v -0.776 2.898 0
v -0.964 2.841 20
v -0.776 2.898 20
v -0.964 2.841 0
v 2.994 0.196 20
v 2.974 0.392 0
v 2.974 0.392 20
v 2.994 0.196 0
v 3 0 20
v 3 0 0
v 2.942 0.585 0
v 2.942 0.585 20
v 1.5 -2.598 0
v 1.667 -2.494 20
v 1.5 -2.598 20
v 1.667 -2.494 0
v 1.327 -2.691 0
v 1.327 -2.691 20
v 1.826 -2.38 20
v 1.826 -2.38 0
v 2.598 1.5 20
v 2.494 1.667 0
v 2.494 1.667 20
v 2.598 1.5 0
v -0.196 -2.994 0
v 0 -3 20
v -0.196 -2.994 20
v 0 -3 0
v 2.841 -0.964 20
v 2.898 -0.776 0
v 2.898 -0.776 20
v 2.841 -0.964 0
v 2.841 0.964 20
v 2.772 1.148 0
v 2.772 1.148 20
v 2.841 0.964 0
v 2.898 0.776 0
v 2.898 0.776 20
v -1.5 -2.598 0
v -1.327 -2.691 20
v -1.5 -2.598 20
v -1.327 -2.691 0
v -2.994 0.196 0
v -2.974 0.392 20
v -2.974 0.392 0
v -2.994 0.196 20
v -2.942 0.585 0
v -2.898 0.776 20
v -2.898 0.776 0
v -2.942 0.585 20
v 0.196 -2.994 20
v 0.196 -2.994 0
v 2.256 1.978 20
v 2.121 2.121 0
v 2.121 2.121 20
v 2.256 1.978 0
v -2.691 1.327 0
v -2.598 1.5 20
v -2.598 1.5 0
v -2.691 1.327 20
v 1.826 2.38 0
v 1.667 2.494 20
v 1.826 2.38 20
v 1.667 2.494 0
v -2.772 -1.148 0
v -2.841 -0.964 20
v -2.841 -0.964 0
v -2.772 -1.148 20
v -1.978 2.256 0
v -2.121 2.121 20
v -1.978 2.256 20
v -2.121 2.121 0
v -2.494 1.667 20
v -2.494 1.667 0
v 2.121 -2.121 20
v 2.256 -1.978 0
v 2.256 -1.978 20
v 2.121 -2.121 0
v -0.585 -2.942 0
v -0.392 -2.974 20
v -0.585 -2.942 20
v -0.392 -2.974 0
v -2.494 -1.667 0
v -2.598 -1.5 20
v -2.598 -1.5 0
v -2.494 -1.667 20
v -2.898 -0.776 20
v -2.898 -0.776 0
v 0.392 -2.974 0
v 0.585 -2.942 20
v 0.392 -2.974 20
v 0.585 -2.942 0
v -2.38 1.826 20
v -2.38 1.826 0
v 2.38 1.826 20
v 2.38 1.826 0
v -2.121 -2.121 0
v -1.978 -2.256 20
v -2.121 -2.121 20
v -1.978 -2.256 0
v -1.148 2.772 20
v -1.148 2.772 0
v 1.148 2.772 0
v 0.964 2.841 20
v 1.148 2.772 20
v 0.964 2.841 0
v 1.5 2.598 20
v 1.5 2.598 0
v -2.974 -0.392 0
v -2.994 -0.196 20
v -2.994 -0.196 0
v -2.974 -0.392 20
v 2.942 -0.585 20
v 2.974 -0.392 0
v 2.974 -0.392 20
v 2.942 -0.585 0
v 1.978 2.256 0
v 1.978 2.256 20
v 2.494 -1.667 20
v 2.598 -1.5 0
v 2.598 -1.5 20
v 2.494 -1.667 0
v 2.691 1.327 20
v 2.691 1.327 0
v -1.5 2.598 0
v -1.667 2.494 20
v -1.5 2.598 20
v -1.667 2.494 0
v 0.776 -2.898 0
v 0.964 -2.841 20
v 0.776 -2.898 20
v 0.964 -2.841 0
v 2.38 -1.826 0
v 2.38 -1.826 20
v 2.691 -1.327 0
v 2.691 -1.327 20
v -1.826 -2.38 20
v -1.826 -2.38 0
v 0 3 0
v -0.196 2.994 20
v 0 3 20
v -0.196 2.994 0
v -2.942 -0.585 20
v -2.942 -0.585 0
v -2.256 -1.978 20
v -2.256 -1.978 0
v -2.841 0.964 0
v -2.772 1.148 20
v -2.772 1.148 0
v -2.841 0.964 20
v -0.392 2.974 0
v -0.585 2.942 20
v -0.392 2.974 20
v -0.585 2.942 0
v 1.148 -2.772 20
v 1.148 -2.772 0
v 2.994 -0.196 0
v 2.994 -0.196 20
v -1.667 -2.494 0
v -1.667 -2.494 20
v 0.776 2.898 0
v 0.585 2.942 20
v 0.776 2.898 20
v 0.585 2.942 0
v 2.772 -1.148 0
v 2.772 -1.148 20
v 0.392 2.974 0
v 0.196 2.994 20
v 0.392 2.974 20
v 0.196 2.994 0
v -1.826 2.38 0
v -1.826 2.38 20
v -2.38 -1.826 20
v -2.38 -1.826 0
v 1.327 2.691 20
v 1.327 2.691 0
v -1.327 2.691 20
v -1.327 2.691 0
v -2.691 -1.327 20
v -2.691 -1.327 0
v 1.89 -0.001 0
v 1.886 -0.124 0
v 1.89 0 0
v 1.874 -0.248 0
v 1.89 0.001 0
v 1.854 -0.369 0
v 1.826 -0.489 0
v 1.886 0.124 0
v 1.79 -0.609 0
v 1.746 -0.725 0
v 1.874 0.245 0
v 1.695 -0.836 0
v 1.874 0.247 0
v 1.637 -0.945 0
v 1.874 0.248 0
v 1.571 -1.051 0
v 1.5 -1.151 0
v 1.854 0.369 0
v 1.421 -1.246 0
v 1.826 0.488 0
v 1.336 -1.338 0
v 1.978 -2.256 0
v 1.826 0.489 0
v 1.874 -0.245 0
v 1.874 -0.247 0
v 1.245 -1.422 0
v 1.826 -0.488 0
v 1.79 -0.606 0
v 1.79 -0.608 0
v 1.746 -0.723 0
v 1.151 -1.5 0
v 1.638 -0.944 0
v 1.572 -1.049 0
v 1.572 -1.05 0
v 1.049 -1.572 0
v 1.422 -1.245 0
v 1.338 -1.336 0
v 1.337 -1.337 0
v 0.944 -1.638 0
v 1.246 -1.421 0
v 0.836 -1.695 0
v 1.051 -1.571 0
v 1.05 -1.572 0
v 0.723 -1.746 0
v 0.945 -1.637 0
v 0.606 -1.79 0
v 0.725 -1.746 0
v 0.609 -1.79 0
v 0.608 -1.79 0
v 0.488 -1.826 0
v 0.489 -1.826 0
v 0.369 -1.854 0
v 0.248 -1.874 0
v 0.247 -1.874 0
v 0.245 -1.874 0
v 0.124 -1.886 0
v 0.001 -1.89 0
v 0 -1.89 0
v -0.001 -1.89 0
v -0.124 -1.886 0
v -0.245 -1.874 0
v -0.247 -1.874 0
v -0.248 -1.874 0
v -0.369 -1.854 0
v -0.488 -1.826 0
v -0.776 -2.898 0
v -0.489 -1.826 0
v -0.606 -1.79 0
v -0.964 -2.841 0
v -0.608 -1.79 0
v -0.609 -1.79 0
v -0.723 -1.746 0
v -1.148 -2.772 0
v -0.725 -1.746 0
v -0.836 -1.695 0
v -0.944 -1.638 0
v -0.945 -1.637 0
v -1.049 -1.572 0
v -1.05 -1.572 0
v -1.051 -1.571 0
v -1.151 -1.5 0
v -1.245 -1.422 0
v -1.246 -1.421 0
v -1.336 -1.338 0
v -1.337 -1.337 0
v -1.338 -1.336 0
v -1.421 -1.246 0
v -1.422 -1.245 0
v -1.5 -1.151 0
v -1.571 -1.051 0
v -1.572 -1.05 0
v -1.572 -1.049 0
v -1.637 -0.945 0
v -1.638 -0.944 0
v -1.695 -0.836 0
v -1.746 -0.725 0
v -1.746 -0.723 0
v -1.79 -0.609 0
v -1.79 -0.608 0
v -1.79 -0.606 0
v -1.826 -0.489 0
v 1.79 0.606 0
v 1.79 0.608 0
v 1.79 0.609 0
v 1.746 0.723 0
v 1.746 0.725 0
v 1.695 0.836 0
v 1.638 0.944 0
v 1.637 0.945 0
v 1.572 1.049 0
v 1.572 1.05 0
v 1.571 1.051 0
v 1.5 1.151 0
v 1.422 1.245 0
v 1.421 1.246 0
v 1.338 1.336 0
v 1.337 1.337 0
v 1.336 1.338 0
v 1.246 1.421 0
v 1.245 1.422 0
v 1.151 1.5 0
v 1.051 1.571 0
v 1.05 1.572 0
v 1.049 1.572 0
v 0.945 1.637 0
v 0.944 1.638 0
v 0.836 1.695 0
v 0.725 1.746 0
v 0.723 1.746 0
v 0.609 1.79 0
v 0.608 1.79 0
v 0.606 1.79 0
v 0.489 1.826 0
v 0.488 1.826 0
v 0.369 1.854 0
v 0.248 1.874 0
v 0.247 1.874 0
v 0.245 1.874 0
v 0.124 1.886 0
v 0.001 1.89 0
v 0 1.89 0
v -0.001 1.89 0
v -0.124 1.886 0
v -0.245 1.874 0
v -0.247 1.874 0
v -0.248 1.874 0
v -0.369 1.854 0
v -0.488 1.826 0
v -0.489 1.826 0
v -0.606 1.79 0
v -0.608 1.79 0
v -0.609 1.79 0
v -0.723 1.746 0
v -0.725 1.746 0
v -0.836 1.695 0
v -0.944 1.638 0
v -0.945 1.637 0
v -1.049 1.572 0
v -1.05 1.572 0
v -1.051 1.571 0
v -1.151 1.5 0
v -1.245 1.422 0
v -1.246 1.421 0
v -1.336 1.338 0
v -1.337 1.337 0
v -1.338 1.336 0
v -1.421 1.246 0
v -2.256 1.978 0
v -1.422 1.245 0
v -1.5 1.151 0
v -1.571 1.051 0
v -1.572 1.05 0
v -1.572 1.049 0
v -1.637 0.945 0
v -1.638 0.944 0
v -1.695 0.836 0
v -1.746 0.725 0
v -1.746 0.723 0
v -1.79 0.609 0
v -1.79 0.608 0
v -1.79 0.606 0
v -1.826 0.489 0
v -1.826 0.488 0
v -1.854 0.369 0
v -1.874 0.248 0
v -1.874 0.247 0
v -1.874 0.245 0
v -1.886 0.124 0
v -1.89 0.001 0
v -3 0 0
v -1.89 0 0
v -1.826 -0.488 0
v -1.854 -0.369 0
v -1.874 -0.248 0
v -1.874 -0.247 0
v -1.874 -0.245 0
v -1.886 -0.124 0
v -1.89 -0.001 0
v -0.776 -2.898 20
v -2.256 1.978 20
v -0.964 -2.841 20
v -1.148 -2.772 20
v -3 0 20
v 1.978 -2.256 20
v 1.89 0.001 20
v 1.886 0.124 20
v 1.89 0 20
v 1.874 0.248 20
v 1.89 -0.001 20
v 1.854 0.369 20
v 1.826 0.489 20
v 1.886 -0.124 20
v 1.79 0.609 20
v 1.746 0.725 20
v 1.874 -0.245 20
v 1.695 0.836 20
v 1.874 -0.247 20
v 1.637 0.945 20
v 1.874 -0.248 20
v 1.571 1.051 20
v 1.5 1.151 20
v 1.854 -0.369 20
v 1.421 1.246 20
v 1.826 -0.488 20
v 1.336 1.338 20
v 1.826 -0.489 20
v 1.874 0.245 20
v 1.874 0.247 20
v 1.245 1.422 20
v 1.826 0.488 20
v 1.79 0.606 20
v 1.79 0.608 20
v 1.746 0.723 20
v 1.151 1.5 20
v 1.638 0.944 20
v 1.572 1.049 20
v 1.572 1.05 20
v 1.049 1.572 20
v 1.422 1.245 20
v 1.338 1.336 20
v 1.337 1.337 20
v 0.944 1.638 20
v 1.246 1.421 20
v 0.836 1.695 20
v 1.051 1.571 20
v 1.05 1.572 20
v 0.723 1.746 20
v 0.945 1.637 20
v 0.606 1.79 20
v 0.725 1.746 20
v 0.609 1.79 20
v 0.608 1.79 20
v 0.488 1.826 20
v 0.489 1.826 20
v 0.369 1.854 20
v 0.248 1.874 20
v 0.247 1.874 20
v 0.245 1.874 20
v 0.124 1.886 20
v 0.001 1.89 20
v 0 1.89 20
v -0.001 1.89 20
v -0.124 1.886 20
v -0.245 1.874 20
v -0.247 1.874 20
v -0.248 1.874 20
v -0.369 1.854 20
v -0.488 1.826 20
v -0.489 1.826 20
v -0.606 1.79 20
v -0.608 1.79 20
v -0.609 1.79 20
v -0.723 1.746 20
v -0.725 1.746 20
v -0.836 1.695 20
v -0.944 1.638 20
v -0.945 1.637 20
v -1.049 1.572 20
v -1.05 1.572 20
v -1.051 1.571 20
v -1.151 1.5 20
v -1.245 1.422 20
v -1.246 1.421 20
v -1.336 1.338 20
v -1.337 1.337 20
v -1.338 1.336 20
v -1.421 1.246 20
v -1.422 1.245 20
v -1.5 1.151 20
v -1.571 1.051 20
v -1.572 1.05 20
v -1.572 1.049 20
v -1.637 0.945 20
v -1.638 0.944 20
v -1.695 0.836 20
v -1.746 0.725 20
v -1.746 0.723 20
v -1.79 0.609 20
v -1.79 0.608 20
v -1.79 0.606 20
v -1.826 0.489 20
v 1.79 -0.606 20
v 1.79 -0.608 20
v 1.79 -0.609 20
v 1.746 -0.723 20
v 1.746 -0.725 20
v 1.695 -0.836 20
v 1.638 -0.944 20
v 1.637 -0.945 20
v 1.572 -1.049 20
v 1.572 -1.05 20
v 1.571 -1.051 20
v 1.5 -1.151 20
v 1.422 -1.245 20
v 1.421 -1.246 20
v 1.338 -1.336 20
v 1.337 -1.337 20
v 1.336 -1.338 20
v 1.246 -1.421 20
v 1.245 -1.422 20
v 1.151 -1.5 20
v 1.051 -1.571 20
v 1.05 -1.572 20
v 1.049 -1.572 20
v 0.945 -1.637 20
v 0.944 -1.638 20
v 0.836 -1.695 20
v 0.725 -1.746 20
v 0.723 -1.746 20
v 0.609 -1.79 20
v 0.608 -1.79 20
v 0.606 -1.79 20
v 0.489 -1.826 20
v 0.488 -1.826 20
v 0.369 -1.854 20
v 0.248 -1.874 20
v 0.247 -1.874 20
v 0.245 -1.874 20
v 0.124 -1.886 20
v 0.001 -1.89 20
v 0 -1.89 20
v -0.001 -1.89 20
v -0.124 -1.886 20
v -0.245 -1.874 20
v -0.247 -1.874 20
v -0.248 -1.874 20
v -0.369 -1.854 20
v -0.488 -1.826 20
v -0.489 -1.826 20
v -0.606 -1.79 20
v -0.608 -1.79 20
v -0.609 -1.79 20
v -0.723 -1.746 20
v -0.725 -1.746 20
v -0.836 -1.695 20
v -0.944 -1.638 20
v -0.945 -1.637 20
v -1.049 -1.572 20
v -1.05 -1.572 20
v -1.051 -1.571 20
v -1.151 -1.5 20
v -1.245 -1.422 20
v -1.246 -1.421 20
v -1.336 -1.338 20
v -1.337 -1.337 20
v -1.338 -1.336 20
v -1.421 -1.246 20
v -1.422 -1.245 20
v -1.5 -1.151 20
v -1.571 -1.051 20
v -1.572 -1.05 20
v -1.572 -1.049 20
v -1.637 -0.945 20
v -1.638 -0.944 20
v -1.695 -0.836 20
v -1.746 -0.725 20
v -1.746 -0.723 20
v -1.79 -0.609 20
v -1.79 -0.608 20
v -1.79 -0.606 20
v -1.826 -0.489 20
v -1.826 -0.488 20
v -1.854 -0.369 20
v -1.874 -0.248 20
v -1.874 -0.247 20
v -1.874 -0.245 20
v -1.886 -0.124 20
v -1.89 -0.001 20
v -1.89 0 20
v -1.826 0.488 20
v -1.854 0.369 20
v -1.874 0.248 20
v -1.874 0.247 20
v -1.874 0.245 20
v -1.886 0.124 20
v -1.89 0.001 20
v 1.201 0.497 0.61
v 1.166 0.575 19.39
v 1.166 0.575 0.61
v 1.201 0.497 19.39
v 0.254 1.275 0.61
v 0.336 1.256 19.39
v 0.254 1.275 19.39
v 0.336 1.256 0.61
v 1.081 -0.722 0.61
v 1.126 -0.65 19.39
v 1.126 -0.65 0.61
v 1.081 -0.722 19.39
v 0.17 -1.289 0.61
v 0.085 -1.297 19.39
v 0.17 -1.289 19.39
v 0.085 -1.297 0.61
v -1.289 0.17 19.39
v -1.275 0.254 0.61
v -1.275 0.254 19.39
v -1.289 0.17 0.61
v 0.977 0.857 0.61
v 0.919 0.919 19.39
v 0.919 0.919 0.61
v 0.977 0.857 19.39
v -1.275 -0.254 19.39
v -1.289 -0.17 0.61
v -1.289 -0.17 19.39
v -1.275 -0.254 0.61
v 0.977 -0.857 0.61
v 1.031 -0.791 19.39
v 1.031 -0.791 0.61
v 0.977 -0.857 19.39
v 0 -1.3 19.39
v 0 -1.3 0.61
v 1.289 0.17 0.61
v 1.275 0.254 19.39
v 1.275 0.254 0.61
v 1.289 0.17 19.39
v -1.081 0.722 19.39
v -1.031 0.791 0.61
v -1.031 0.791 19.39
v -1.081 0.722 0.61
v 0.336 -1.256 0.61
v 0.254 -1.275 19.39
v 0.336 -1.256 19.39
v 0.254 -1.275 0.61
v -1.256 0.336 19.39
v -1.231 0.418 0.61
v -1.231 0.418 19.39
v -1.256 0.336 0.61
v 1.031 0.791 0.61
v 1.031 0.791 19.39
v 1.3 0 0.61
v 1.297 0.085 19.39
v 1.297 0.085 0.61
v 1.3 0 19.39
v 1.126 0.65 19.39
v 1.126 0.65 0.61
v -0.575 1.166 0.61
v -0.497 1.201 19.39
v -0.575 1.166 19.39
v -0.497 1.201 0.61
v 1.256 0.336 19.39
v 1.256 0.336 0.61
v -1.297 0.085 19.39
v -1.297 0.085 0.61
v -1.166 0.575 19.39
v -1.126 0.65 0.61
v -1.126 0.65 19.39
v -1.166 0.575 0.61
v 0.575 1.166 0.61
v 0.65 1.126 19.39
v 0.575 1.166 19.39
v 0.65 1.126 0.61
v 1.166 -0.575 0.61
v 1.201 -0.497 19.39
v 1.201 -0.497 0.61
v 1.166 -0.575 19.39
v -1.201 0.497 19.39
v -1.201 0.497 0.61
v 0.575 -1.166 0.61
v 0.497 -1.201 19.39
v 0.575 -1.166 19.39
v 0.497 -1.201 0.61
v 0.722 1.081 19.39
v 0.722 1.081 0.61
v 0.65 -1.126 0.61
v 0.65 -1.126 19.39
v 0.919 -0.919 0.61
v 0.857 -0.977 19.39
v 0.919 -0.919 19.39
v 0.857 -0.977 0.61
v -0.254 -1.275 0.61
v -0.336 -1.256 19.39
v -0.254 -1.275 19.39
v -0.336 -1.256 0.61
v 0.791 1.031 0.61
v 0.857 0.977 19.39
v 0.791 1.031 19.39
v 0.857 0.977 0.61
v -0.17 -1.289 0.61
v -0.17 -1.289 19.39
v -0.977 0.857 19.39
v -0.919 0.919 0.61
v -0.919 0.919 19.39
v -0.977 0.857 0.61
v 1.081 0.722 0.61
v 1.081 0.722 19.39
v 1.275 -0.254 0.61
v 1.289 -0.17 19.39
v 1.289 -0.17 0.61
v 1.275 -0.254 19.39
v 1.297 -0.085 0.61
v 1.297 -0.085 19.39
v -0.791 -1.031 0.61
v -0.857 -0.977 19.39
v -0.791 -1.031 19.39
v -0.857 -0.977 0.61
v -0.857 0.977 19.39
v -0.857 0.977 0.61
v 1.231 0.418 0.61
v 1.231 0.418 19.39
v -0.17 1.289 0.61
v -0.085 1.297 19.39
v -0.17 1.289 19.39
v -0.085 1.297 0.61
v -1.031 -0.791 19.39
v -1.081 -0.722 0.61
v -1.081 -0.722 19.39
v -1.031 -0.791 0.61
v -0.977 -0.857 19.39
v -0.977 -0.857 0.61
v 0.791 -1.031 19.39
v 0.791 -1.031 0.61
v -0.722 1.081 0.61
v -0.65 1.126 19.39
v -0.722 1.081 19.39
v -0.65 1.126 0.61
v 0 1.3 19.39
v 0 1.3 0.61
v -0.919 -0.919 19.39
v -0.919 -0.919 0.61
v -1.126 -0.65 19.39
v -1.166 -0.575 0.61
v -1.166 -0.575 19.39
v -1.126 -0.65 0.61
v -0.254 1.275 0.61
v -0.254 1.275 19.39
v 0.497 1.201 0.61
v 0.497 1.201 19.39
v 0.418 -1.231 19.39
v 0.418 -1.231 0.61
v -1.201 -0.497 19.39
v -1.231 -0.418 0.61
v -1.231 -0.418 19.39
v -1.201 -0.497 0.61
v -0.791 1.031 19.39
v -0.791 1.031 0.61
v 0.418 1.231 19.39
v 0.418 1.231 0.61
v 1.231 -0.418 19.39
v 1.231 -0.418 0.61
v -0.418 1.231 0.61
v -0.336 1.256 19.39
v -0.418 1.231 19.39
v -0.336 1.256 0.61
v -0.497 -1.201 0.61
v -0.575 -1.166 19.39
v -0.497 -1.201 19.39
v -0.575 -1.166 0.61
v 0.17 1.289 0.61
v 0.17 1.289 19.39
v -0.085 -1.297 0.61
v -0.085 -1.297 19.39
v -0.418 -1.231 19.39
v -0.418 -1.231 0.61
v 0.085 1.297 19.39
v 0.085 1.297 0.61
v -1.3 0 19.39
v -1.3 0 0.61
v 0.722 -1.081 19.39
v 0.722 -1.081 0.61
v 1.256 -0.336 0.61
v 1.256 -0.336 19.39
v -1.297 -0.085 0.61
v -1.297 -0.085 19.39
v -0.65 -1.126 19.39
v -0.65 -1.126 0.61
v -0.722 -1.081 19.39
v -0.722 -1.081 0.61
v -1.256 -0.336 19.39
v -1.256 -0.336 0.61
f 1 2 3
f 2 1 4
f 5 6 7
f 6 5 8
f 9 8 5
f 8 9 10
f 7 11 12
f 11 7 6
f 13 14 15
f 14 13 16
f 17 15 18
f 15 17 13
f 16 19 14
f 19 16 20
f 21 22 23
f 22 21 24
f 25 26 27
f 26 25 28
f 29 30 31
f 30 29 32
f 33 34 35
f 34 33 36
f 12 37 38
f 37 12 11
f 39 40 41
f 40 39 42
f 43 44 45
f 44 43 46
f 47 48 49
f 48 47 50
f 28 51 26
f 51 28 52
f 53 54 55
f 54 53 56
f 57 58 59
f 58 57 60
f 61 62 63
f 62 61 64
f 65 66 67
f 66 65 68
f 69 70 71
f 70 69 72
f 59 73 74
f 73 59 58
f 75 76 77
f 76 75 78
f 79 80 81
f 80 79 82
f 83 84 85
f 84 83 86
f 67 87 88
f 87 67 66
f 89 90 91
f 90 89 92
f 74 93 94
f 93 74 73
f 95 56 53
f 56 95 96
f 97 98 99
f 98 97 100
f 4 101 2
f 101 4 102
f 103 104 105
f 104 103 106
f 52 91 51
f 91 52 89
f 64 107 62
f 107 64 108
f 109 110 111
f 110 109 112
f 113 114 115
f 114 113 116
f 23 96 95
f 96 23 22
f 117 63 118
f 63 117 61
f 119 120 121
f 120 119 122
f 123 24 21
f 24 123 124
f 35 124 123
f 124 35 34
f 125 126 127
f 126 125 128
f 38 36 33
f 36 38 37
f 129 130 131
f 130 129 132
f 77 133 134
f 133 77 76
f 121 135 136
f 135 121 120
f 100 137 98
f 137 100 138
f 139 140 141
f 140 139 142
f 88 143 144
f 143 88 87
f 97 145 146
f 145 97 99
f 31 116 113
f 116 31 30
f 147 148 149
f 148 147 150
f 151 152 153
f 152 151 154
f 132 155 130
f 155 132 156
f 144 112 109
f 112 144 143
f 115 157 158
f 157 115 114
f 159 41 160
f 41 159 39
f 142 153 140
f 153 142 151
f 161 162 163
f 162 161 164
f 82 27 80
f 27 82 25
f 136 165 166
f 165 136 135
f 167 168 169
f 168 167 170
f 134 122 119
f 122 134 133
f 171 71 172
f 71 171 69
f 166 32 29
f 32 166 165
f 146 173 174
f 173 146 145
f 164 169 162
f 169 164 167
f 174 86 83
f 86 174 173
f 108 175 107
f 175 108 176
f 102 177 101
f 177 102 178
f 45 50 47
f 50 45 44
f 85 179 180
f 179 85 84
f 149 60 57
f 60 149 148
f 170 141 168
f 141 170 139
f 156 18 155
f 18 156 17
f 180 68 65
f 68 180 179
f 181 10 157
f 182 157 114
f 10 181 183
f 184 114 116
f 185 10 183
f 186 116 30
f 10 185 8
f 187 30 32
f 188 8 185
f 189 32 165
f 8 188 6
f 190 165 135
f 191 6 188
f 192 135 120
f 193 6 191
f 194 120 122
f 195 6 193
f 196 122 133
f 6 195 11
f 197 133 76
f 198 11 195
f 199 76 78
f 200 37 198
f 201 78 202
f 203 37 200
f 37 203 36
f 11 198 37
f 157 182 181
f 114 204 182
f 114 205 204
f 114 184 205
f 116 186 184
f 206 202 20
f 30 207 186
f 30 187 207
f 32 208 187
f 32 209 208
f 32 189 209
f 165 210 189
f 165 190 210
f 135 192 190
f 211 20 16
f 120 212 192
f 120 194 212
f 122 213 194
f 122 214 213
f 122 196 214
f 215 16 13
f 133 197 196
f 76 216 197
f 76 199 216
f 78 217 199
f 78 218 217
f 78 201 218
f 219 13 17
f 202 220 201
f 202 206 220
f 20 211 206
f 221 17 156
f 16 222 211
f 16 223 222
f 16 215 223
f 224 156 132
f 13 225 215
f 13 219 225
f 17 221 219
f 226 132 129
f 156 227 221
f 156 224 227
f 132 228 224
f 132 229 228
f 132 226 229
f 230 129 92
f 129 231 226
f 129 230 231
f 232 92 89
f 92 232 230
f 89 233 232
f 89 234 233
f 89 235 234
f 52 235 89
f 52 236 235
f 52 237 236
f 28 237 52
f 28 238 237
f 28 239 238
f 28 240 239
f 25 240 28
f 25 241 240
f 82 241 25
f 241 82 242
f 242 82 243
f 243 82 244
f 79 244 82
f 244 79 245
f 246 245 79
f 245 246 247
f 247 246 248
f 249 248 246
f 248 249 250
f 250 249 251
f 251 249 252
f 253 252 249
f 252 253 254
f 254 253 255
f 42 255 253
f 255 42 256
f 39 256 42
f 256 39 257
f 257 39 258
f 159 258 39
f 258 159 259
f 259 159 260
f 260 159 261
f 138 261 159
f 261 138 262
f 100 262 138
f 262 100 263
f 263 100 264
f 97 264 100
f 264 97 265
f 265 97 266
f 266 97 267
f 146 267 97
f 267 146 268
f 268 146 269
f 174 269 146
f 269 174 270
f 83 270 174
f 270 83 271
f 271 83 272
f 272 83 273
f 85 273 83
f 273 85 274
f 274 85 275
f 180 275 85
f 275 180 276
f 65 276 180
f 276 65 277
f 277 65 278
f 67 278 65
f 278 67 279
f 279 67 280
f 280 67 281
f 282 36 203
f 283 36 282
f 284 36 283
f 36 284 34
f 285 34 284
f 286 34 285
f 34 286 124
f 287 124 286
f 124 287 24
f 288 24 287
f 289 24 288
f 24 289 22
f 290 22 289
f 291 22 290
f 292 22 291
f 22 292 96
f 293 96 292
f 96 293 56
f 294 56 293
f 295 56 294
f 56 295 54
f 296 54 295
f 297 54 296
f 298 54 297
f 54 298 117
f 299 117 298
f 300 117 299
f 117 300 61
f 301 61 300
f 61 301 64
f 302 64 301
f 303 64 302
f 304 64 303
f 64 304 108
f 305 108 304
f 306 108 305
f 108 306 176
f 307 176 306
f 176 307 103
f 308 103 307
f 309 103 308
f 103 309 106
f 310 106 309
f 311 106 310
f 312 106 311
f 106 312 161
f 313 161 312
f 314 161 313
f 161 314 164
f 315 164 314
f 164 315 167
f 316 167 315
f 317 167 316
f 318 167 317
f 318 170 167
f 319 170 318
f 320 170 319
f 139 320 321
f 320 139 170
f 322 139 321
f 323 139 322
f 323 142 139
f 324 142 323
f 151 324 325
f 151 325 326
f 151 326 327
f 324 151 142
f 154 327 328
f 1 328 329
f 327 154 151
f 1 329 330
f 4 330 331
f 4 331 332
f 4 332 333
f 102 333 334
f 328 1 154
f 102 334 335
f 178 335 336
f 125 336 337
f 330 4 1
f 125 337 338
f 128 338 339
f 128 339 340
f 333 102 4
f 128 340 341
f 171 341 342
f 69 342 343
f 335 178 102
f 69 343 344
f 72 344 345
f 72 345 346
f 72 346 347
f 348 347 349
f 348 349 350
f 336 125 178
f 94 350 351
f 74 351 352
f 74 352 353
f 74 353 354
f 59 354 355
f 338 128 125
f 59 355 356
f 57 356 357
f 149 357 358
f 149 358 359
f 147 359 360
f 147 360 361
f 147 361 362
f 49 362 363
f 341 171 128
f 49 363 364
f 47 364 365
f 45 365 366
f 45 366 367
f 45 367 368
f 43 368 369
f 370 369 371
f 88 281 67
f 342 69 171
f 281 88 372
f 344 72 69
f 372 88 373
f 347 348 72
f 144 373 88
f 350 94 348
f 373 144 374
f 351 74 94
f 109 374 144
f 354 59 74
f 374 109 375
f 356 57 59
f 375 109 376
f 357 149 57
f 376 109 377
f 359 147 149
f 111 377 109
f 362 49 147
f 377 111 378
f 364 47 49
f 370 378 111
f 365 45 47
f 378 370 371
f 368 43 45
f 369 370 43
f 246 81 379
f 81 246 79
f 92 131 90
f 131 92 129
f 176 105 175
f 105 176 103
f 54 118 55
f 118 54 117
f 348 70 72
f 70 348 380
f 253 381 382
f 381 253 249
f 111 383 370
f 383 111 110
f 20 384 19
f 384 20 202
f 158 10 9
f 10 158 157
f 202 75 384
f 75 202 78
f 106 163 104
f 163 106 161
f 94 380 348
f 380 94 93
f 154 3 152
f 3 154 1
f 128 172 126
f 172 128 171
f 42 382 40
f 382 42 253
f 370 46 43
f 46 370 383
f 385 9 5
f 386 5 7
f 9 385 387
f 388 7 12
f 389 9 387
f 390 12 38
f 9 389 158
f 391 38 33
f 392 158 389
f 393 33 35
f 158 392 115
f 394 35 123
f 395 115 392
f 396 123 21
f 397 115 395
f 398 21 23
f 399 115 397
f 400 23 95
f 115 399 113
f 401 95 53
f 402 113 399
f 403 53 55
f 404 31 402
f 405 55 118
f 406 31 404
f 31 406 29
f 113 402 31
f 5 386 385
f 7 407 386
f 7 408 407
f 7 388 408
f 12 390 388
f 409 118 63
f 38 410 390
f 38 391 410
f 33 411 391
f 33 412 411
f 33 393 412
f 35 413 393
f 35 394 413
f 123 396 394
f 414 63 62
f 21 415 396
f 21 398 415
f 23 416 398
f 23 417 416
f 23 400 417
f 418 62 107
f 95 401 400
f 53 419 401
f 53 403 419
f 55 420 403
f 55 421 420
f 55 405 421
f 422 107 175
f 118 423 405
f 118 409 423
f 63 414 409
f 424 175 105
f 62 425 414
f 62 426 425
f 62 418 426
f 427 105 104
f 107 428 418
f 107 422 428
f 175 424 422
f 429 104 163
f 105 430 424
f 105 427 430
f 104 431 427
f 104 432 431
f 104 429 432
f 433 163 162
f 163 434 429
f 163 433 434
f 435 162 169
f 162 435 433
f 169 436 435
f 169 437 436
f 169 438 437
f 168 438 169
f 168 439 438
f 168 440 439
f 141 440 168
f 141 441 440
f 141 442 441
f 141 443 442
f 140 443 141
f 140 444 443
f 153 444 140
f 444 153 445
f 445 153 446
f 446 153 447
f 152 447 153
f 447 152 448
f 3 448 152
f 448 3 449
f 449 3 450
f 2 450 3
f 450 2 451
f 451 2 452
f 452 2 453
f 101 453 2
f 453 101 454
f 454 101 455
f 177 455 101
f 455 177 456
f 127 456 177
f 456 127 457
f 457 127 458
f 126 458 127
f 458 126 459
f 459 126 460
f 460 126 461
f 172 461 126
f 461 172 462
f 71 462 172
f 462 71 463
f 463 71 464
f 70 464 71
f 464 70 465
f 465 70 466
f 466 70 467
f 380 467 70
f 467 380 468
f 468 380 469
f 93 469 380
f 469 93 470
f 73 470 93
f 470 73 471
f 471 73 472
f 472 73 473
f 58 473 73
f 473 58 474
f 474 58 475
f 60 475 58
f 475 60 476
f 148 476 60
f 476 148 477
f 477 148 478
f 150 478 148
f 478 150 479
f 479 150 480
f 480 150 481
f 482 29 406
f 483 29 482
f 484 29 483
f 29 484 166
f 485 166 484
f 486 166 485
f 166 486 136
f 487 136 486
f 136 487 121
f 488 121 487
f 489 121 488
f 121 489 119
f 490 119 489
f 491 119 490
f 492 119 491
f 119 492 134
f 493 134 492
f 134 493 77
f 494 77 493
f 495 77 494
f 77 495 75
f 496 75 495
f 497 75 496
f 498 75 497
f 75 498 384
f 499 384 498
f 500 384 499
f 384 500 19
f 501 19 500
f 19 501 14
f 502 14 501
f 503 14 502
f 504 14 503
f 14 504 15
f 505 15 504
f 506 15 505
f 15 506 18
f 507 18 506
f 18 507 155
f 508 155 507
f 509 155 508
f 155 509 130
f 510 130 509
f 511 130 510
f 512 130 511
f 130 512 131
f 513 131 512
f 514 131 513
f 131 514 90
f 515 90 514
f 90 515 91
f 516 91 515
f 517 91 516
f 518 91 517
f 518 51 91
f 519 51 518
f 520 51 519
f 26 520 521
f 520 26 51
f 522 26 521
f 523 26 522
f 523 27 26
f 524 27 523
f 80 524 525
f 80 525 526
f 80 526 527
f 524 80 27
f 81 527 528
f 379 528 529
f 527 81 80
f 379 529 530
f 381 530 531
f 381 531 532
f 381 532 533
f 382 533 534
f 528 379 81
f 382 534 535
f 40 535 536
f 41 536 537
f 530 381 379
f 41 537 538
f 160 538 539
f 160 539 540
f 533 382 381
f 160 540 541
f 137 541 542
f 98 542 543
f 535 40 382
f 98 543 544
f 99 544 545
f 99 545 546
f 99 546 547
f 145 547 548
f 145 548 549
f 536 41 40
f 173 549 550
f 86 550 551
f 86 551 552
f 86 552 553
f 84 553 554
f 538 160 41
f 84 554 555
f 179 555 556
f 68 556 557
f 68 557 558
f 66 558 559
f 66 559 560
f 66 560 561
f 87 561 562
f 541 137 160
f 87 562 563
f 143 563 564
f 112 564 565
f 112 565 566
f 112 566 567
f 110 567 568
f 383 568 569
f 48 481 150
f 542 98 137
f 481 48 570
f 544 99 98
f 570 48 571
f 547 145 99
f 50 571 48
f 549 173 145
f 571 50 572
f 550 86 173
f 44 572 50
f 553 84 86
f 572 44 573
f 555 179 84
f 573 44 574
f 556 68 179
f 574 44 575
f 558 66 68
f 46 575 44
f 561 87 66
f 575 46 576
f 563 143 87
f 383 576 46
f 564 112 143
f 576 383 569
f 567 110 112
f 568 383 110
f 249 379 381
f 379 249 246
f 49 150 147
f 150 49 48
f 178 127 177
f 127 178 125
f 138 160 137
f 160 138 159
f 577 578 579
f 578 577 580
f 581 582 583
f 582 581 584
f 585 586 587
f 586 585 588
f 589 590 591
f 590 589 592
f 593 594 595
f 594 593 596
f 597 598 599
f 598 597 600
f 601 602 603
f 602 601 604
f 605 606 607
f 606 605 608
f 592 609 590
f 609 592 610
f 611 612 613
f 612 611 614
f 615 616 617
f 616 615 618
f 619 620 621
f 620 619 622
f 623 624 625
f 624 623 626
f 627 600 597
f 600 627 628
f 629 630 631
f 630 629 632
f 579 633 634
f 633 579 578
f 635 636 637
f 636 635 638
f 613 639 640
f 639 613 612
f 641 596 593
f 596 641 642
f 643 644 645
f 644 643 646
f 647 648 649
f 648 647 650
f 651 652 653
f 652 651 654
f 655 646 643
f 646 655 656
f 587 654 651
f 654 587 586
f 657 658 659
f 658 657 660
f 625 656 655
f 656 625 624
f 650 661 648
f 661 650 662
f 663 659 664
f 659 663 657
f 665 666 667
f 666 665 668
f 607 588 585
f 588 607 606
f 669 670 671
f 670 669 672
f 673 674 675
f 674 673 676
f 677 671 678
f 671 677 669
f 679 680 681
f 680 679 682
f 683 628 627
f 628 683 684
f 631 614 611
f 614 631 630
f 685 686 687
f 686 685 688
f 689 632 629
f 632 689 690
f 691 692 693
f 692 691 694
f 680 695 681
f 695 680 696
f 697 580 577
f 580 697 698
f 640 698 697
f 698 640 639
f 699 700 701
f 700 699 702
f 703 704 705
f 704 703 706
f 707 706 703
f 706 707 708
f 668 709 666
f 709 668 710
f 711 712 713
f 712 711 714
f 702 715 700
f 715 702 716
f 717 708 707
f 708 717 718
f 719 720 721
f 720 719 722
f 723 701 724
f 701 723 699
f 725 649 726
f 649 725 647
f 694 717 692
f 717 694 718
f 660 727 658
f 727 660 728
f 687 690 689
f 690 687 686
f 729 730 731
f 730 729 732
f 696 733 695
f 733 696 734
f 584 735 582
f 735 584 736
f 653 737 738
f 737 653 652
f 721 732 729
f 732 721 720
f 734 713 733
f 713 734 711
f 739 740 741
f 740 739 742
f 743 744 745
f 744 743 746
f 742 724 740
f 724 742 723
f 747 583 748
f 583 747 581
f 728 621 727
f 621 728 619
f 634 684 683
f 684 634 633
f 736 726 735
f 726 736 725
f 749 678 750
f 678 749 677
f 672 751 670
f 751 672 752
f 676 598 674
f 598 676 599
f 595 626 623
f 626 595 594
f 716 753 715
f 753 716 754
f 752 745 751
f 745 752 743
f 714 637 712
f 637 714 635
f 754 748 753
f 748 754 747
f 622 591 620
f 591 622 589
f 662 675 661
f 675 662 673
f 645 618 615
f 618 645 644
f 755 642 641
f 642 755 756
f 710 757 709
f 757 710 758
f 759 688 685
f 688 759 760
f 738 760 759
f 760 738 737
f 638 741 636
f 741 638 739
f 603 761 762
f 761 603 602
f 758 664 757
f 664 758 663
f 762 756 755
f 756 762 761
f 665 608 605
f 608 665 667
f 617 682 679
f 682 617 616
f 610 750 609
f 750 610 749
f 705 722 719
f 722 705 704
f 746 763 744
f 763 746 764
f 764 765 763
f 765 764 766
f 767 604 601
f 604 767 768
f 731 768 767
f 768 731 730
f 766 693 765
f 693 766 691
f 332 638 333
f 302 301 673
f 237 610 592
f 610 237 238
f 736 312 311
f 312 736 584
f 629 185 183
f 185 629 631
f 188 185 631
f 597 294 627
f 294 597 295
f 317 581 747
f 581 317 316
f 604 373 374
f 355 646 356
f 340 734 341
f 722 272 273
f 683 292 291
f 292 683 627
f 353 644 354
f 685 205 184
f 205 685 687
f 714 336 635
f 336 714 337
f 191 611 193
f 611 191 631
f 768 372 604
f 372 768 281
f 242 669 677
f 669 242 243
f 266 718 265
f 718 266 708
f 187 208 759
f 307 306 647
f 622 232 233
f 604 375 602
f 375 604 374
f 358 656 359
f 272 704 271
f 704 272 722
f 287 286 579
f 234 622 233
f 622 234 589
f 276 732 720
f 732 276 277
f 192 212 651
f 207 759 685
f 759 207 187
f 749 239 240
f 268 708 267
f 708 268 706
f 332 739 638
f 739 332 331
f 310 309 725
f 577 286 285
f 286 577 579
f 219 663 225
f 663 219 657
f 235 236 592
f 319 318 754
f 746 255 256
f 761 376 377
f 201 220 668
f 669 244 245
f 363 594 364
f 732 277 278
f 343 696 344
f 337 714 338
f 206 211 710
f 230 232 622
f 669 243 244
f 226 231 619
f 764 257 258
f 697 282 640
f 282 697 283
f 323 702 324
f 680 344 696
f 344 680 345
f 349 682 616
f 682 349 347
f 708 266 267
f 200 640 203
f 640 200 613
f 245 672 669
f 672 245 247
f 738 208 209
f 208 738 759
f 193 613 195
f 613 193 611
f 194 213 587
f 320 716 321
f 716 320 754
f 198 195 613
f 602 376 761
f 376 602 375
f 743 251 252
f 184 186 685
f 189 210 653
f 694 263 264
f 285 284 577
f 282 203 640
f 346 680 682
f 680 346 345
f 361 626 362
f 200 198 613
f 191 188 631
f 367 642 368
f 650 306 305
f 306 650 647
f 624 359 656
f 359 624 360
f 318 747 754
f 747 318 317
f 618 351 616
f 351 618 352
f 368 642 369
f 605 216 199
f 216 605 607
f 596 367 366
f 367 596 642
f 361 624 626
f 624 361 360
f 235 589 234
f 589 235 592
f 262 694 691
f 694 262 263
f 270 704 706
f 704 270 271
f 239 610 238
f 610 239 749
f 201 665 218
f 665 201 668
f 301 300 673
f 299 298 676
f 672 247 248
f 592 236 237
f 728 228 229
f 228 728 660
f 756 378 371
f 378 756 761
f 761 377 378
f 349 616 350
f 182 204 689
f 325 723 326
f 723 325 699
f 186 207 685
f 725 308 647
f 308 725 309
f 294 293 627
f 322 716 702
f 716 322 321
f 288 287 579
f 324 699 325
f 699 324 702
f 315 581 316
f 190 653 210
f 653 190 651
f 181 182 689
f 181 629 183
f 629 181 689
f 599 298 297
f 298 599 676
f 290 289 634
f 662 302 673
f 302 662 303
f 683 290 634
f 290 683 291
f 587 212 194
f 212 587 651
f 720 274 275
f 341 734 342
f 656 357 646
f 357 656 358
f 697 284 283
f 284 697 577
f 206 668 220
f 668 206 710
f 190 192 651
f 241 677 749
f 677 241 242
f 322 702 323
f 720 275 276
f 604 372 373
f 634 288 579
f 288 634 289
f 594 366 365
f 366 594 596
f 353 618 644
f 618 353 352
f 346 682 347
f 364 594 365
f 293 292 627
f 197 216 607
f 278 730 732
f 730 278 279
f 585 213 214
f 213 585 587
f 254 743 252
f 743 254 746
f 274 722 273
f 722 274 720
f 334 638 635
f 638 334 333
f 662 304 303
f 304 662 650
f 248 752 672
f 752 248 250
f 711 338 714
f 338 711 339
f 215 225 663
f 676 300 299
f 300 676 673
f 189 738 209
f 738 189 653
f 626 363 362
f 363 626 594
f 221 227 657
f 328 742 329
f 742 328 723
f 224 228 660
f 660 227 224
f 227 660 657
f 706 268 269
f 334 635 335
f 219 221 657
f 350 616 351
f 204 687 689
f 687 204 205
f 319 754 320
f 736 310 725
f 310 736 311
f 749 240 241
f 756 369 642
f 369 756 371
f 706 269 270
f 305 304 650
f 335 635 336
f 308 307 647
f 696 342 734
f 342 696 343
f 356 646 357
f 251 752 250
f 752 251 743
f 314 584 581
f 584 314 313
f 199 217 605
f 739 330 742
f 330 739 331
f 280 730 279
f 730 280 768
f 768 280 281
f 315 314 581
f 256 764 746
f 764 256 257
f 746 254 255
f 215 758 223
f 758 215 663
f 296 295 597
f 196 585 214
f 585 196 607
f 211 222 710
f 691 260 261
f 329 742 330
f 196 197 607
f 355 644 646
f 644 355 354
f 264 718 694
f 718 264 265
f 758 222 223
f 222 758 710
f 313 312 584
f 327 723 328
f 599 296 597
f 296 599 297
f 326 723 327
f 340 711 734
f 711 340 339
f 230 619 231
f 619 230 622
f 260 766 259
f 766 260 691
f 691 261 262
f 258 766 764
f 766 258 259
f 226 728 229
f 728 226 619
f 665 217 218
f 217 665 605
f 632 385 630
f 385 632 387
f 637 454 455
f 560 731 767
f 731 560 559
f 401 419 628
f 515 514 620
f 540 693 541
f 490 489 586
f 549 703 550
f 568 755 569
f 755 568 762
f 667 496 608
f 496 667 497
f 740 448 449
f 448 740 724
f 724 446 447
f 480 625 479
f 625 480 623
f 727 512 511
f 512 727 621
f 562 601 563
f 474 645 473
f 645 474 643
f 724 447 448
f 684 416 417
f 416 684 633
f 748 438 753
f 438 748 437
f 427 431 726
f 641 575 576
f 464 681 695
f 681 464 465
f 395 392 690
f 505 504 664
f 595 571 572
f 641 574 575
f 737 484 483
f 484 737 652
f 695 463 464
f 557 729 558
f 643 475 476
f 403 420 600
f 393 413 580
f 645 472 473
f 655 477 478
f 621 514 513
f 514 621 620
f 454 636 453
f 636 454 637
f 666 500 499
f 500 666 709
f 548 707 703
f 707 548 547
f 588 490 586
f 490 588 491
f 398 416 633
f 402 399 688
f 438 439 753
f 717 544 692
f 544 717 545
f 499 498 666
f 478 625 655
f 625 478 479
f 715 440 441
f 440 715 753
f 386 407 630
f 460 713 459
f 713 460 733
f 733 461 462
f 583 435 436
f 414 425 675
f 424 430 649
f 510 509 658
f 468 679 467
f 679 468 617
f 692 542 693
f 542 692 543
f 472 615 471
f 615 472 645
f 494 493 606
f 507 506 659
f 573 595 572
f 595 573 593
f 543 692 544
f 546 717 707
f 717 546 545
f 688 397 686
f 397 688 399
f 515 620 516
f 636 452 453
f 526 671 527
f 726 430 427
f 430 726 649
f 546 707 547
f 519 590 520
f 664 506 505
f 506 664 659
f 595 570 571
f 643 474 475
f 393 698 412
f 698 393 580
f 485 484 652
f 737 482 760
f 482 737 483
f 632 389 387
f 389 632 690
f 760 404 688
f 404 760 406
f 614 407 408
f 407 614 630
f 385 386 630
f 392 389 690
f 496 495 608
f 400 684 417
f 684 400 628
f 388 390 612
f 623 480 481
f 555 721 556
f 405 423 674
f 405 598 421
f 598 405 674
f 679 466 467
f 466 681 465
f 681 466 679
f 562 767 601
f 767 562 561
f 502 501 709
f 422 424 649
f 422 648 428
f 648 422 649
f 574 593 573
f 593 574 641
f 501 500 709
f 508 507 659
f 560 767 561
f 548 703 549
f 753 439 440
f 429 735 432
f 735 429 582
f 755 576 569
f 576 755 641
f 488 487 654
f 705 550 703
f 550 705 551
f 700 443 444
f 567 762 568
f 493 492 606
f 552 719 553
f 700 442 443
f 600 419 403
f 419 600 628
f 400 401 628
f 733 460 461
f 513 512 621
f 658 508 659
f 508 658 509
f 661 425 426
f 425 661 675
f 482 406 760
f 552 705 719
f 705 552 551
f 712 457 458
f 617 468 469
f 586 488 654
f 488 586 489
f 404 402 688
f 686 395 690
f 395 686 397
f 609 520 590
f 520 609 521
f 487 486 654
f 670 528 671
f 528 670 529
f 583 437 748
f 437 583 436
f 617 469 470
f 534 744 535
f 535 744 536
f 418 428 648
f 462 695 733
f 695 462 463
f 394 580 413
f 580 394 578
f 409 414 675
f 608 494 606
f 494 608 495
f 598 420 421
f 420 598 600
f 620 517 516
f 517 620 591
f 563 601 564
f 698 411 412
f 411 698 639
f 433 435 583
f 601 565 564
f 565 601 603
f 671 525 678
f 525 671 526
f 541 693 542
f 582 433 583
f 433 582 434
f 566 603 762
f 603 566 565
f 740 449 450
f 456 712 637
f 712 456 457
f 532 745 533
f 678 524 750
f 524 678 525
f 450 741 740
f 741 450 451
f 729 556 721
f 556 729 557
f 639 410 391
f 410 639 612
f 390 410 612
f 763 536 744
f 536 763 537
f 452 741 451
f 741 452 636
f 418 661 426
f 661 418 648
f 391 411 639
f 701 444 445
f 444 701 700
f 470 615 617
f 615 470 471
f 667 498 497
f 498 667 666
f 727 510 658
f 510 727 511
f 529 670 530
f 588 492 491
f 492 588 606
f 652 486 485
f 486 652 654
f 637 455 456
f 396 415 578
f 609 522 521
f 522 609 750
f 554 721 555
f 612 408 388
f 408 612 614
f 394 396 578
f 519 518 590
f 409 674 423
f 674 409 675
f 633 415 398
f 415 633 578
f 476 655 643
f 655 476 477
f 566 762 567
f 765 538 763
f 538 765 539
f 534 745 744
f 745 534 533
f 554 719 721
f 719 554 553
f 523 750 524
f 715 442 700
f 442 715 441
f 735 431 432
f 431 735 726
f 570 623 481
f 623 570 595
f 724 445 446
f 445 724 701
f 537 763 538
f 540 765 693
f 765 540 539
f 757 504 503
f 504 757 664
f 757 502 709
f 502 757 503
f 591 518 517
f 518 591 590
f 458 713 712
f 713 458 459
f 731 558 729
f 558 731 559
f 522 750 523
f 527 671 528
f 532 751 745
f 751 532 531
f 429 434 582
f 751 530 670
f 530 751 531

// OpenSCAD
$fn = 96;

thread_d = 3.0;      // nominal thread diameter (mm)
length = 20.0;       // overall length (mm)
outer_d = 6.0;       // fallback pillar diameter since "None" provided (mm)

hole_d = 2.6;        // typical tap drill for M3 (approx)
chamfer = 0.6;

module standoff_pillar(od, h, bore_d) {
    difference() {
        cylinder(d=od, h=h);
        translate([0,0,-0.01])
            cylinder(d=bore_d, h=h+0.02);
        // light chamfers on both ends of the bore
        translate([0,0,-0.01])
            cylinder(d1=bore_d+2*chamfer, d2=bore_d, h=chamfer+0.02);
        translate([0,0,h-chamfer-0.01])
            cylinder(d1=bore_d, d2=bore_d+2*chamfer, h=chamfer+0.02);
    }
}

standoff_pillar(outer_d, length, hole_d);
